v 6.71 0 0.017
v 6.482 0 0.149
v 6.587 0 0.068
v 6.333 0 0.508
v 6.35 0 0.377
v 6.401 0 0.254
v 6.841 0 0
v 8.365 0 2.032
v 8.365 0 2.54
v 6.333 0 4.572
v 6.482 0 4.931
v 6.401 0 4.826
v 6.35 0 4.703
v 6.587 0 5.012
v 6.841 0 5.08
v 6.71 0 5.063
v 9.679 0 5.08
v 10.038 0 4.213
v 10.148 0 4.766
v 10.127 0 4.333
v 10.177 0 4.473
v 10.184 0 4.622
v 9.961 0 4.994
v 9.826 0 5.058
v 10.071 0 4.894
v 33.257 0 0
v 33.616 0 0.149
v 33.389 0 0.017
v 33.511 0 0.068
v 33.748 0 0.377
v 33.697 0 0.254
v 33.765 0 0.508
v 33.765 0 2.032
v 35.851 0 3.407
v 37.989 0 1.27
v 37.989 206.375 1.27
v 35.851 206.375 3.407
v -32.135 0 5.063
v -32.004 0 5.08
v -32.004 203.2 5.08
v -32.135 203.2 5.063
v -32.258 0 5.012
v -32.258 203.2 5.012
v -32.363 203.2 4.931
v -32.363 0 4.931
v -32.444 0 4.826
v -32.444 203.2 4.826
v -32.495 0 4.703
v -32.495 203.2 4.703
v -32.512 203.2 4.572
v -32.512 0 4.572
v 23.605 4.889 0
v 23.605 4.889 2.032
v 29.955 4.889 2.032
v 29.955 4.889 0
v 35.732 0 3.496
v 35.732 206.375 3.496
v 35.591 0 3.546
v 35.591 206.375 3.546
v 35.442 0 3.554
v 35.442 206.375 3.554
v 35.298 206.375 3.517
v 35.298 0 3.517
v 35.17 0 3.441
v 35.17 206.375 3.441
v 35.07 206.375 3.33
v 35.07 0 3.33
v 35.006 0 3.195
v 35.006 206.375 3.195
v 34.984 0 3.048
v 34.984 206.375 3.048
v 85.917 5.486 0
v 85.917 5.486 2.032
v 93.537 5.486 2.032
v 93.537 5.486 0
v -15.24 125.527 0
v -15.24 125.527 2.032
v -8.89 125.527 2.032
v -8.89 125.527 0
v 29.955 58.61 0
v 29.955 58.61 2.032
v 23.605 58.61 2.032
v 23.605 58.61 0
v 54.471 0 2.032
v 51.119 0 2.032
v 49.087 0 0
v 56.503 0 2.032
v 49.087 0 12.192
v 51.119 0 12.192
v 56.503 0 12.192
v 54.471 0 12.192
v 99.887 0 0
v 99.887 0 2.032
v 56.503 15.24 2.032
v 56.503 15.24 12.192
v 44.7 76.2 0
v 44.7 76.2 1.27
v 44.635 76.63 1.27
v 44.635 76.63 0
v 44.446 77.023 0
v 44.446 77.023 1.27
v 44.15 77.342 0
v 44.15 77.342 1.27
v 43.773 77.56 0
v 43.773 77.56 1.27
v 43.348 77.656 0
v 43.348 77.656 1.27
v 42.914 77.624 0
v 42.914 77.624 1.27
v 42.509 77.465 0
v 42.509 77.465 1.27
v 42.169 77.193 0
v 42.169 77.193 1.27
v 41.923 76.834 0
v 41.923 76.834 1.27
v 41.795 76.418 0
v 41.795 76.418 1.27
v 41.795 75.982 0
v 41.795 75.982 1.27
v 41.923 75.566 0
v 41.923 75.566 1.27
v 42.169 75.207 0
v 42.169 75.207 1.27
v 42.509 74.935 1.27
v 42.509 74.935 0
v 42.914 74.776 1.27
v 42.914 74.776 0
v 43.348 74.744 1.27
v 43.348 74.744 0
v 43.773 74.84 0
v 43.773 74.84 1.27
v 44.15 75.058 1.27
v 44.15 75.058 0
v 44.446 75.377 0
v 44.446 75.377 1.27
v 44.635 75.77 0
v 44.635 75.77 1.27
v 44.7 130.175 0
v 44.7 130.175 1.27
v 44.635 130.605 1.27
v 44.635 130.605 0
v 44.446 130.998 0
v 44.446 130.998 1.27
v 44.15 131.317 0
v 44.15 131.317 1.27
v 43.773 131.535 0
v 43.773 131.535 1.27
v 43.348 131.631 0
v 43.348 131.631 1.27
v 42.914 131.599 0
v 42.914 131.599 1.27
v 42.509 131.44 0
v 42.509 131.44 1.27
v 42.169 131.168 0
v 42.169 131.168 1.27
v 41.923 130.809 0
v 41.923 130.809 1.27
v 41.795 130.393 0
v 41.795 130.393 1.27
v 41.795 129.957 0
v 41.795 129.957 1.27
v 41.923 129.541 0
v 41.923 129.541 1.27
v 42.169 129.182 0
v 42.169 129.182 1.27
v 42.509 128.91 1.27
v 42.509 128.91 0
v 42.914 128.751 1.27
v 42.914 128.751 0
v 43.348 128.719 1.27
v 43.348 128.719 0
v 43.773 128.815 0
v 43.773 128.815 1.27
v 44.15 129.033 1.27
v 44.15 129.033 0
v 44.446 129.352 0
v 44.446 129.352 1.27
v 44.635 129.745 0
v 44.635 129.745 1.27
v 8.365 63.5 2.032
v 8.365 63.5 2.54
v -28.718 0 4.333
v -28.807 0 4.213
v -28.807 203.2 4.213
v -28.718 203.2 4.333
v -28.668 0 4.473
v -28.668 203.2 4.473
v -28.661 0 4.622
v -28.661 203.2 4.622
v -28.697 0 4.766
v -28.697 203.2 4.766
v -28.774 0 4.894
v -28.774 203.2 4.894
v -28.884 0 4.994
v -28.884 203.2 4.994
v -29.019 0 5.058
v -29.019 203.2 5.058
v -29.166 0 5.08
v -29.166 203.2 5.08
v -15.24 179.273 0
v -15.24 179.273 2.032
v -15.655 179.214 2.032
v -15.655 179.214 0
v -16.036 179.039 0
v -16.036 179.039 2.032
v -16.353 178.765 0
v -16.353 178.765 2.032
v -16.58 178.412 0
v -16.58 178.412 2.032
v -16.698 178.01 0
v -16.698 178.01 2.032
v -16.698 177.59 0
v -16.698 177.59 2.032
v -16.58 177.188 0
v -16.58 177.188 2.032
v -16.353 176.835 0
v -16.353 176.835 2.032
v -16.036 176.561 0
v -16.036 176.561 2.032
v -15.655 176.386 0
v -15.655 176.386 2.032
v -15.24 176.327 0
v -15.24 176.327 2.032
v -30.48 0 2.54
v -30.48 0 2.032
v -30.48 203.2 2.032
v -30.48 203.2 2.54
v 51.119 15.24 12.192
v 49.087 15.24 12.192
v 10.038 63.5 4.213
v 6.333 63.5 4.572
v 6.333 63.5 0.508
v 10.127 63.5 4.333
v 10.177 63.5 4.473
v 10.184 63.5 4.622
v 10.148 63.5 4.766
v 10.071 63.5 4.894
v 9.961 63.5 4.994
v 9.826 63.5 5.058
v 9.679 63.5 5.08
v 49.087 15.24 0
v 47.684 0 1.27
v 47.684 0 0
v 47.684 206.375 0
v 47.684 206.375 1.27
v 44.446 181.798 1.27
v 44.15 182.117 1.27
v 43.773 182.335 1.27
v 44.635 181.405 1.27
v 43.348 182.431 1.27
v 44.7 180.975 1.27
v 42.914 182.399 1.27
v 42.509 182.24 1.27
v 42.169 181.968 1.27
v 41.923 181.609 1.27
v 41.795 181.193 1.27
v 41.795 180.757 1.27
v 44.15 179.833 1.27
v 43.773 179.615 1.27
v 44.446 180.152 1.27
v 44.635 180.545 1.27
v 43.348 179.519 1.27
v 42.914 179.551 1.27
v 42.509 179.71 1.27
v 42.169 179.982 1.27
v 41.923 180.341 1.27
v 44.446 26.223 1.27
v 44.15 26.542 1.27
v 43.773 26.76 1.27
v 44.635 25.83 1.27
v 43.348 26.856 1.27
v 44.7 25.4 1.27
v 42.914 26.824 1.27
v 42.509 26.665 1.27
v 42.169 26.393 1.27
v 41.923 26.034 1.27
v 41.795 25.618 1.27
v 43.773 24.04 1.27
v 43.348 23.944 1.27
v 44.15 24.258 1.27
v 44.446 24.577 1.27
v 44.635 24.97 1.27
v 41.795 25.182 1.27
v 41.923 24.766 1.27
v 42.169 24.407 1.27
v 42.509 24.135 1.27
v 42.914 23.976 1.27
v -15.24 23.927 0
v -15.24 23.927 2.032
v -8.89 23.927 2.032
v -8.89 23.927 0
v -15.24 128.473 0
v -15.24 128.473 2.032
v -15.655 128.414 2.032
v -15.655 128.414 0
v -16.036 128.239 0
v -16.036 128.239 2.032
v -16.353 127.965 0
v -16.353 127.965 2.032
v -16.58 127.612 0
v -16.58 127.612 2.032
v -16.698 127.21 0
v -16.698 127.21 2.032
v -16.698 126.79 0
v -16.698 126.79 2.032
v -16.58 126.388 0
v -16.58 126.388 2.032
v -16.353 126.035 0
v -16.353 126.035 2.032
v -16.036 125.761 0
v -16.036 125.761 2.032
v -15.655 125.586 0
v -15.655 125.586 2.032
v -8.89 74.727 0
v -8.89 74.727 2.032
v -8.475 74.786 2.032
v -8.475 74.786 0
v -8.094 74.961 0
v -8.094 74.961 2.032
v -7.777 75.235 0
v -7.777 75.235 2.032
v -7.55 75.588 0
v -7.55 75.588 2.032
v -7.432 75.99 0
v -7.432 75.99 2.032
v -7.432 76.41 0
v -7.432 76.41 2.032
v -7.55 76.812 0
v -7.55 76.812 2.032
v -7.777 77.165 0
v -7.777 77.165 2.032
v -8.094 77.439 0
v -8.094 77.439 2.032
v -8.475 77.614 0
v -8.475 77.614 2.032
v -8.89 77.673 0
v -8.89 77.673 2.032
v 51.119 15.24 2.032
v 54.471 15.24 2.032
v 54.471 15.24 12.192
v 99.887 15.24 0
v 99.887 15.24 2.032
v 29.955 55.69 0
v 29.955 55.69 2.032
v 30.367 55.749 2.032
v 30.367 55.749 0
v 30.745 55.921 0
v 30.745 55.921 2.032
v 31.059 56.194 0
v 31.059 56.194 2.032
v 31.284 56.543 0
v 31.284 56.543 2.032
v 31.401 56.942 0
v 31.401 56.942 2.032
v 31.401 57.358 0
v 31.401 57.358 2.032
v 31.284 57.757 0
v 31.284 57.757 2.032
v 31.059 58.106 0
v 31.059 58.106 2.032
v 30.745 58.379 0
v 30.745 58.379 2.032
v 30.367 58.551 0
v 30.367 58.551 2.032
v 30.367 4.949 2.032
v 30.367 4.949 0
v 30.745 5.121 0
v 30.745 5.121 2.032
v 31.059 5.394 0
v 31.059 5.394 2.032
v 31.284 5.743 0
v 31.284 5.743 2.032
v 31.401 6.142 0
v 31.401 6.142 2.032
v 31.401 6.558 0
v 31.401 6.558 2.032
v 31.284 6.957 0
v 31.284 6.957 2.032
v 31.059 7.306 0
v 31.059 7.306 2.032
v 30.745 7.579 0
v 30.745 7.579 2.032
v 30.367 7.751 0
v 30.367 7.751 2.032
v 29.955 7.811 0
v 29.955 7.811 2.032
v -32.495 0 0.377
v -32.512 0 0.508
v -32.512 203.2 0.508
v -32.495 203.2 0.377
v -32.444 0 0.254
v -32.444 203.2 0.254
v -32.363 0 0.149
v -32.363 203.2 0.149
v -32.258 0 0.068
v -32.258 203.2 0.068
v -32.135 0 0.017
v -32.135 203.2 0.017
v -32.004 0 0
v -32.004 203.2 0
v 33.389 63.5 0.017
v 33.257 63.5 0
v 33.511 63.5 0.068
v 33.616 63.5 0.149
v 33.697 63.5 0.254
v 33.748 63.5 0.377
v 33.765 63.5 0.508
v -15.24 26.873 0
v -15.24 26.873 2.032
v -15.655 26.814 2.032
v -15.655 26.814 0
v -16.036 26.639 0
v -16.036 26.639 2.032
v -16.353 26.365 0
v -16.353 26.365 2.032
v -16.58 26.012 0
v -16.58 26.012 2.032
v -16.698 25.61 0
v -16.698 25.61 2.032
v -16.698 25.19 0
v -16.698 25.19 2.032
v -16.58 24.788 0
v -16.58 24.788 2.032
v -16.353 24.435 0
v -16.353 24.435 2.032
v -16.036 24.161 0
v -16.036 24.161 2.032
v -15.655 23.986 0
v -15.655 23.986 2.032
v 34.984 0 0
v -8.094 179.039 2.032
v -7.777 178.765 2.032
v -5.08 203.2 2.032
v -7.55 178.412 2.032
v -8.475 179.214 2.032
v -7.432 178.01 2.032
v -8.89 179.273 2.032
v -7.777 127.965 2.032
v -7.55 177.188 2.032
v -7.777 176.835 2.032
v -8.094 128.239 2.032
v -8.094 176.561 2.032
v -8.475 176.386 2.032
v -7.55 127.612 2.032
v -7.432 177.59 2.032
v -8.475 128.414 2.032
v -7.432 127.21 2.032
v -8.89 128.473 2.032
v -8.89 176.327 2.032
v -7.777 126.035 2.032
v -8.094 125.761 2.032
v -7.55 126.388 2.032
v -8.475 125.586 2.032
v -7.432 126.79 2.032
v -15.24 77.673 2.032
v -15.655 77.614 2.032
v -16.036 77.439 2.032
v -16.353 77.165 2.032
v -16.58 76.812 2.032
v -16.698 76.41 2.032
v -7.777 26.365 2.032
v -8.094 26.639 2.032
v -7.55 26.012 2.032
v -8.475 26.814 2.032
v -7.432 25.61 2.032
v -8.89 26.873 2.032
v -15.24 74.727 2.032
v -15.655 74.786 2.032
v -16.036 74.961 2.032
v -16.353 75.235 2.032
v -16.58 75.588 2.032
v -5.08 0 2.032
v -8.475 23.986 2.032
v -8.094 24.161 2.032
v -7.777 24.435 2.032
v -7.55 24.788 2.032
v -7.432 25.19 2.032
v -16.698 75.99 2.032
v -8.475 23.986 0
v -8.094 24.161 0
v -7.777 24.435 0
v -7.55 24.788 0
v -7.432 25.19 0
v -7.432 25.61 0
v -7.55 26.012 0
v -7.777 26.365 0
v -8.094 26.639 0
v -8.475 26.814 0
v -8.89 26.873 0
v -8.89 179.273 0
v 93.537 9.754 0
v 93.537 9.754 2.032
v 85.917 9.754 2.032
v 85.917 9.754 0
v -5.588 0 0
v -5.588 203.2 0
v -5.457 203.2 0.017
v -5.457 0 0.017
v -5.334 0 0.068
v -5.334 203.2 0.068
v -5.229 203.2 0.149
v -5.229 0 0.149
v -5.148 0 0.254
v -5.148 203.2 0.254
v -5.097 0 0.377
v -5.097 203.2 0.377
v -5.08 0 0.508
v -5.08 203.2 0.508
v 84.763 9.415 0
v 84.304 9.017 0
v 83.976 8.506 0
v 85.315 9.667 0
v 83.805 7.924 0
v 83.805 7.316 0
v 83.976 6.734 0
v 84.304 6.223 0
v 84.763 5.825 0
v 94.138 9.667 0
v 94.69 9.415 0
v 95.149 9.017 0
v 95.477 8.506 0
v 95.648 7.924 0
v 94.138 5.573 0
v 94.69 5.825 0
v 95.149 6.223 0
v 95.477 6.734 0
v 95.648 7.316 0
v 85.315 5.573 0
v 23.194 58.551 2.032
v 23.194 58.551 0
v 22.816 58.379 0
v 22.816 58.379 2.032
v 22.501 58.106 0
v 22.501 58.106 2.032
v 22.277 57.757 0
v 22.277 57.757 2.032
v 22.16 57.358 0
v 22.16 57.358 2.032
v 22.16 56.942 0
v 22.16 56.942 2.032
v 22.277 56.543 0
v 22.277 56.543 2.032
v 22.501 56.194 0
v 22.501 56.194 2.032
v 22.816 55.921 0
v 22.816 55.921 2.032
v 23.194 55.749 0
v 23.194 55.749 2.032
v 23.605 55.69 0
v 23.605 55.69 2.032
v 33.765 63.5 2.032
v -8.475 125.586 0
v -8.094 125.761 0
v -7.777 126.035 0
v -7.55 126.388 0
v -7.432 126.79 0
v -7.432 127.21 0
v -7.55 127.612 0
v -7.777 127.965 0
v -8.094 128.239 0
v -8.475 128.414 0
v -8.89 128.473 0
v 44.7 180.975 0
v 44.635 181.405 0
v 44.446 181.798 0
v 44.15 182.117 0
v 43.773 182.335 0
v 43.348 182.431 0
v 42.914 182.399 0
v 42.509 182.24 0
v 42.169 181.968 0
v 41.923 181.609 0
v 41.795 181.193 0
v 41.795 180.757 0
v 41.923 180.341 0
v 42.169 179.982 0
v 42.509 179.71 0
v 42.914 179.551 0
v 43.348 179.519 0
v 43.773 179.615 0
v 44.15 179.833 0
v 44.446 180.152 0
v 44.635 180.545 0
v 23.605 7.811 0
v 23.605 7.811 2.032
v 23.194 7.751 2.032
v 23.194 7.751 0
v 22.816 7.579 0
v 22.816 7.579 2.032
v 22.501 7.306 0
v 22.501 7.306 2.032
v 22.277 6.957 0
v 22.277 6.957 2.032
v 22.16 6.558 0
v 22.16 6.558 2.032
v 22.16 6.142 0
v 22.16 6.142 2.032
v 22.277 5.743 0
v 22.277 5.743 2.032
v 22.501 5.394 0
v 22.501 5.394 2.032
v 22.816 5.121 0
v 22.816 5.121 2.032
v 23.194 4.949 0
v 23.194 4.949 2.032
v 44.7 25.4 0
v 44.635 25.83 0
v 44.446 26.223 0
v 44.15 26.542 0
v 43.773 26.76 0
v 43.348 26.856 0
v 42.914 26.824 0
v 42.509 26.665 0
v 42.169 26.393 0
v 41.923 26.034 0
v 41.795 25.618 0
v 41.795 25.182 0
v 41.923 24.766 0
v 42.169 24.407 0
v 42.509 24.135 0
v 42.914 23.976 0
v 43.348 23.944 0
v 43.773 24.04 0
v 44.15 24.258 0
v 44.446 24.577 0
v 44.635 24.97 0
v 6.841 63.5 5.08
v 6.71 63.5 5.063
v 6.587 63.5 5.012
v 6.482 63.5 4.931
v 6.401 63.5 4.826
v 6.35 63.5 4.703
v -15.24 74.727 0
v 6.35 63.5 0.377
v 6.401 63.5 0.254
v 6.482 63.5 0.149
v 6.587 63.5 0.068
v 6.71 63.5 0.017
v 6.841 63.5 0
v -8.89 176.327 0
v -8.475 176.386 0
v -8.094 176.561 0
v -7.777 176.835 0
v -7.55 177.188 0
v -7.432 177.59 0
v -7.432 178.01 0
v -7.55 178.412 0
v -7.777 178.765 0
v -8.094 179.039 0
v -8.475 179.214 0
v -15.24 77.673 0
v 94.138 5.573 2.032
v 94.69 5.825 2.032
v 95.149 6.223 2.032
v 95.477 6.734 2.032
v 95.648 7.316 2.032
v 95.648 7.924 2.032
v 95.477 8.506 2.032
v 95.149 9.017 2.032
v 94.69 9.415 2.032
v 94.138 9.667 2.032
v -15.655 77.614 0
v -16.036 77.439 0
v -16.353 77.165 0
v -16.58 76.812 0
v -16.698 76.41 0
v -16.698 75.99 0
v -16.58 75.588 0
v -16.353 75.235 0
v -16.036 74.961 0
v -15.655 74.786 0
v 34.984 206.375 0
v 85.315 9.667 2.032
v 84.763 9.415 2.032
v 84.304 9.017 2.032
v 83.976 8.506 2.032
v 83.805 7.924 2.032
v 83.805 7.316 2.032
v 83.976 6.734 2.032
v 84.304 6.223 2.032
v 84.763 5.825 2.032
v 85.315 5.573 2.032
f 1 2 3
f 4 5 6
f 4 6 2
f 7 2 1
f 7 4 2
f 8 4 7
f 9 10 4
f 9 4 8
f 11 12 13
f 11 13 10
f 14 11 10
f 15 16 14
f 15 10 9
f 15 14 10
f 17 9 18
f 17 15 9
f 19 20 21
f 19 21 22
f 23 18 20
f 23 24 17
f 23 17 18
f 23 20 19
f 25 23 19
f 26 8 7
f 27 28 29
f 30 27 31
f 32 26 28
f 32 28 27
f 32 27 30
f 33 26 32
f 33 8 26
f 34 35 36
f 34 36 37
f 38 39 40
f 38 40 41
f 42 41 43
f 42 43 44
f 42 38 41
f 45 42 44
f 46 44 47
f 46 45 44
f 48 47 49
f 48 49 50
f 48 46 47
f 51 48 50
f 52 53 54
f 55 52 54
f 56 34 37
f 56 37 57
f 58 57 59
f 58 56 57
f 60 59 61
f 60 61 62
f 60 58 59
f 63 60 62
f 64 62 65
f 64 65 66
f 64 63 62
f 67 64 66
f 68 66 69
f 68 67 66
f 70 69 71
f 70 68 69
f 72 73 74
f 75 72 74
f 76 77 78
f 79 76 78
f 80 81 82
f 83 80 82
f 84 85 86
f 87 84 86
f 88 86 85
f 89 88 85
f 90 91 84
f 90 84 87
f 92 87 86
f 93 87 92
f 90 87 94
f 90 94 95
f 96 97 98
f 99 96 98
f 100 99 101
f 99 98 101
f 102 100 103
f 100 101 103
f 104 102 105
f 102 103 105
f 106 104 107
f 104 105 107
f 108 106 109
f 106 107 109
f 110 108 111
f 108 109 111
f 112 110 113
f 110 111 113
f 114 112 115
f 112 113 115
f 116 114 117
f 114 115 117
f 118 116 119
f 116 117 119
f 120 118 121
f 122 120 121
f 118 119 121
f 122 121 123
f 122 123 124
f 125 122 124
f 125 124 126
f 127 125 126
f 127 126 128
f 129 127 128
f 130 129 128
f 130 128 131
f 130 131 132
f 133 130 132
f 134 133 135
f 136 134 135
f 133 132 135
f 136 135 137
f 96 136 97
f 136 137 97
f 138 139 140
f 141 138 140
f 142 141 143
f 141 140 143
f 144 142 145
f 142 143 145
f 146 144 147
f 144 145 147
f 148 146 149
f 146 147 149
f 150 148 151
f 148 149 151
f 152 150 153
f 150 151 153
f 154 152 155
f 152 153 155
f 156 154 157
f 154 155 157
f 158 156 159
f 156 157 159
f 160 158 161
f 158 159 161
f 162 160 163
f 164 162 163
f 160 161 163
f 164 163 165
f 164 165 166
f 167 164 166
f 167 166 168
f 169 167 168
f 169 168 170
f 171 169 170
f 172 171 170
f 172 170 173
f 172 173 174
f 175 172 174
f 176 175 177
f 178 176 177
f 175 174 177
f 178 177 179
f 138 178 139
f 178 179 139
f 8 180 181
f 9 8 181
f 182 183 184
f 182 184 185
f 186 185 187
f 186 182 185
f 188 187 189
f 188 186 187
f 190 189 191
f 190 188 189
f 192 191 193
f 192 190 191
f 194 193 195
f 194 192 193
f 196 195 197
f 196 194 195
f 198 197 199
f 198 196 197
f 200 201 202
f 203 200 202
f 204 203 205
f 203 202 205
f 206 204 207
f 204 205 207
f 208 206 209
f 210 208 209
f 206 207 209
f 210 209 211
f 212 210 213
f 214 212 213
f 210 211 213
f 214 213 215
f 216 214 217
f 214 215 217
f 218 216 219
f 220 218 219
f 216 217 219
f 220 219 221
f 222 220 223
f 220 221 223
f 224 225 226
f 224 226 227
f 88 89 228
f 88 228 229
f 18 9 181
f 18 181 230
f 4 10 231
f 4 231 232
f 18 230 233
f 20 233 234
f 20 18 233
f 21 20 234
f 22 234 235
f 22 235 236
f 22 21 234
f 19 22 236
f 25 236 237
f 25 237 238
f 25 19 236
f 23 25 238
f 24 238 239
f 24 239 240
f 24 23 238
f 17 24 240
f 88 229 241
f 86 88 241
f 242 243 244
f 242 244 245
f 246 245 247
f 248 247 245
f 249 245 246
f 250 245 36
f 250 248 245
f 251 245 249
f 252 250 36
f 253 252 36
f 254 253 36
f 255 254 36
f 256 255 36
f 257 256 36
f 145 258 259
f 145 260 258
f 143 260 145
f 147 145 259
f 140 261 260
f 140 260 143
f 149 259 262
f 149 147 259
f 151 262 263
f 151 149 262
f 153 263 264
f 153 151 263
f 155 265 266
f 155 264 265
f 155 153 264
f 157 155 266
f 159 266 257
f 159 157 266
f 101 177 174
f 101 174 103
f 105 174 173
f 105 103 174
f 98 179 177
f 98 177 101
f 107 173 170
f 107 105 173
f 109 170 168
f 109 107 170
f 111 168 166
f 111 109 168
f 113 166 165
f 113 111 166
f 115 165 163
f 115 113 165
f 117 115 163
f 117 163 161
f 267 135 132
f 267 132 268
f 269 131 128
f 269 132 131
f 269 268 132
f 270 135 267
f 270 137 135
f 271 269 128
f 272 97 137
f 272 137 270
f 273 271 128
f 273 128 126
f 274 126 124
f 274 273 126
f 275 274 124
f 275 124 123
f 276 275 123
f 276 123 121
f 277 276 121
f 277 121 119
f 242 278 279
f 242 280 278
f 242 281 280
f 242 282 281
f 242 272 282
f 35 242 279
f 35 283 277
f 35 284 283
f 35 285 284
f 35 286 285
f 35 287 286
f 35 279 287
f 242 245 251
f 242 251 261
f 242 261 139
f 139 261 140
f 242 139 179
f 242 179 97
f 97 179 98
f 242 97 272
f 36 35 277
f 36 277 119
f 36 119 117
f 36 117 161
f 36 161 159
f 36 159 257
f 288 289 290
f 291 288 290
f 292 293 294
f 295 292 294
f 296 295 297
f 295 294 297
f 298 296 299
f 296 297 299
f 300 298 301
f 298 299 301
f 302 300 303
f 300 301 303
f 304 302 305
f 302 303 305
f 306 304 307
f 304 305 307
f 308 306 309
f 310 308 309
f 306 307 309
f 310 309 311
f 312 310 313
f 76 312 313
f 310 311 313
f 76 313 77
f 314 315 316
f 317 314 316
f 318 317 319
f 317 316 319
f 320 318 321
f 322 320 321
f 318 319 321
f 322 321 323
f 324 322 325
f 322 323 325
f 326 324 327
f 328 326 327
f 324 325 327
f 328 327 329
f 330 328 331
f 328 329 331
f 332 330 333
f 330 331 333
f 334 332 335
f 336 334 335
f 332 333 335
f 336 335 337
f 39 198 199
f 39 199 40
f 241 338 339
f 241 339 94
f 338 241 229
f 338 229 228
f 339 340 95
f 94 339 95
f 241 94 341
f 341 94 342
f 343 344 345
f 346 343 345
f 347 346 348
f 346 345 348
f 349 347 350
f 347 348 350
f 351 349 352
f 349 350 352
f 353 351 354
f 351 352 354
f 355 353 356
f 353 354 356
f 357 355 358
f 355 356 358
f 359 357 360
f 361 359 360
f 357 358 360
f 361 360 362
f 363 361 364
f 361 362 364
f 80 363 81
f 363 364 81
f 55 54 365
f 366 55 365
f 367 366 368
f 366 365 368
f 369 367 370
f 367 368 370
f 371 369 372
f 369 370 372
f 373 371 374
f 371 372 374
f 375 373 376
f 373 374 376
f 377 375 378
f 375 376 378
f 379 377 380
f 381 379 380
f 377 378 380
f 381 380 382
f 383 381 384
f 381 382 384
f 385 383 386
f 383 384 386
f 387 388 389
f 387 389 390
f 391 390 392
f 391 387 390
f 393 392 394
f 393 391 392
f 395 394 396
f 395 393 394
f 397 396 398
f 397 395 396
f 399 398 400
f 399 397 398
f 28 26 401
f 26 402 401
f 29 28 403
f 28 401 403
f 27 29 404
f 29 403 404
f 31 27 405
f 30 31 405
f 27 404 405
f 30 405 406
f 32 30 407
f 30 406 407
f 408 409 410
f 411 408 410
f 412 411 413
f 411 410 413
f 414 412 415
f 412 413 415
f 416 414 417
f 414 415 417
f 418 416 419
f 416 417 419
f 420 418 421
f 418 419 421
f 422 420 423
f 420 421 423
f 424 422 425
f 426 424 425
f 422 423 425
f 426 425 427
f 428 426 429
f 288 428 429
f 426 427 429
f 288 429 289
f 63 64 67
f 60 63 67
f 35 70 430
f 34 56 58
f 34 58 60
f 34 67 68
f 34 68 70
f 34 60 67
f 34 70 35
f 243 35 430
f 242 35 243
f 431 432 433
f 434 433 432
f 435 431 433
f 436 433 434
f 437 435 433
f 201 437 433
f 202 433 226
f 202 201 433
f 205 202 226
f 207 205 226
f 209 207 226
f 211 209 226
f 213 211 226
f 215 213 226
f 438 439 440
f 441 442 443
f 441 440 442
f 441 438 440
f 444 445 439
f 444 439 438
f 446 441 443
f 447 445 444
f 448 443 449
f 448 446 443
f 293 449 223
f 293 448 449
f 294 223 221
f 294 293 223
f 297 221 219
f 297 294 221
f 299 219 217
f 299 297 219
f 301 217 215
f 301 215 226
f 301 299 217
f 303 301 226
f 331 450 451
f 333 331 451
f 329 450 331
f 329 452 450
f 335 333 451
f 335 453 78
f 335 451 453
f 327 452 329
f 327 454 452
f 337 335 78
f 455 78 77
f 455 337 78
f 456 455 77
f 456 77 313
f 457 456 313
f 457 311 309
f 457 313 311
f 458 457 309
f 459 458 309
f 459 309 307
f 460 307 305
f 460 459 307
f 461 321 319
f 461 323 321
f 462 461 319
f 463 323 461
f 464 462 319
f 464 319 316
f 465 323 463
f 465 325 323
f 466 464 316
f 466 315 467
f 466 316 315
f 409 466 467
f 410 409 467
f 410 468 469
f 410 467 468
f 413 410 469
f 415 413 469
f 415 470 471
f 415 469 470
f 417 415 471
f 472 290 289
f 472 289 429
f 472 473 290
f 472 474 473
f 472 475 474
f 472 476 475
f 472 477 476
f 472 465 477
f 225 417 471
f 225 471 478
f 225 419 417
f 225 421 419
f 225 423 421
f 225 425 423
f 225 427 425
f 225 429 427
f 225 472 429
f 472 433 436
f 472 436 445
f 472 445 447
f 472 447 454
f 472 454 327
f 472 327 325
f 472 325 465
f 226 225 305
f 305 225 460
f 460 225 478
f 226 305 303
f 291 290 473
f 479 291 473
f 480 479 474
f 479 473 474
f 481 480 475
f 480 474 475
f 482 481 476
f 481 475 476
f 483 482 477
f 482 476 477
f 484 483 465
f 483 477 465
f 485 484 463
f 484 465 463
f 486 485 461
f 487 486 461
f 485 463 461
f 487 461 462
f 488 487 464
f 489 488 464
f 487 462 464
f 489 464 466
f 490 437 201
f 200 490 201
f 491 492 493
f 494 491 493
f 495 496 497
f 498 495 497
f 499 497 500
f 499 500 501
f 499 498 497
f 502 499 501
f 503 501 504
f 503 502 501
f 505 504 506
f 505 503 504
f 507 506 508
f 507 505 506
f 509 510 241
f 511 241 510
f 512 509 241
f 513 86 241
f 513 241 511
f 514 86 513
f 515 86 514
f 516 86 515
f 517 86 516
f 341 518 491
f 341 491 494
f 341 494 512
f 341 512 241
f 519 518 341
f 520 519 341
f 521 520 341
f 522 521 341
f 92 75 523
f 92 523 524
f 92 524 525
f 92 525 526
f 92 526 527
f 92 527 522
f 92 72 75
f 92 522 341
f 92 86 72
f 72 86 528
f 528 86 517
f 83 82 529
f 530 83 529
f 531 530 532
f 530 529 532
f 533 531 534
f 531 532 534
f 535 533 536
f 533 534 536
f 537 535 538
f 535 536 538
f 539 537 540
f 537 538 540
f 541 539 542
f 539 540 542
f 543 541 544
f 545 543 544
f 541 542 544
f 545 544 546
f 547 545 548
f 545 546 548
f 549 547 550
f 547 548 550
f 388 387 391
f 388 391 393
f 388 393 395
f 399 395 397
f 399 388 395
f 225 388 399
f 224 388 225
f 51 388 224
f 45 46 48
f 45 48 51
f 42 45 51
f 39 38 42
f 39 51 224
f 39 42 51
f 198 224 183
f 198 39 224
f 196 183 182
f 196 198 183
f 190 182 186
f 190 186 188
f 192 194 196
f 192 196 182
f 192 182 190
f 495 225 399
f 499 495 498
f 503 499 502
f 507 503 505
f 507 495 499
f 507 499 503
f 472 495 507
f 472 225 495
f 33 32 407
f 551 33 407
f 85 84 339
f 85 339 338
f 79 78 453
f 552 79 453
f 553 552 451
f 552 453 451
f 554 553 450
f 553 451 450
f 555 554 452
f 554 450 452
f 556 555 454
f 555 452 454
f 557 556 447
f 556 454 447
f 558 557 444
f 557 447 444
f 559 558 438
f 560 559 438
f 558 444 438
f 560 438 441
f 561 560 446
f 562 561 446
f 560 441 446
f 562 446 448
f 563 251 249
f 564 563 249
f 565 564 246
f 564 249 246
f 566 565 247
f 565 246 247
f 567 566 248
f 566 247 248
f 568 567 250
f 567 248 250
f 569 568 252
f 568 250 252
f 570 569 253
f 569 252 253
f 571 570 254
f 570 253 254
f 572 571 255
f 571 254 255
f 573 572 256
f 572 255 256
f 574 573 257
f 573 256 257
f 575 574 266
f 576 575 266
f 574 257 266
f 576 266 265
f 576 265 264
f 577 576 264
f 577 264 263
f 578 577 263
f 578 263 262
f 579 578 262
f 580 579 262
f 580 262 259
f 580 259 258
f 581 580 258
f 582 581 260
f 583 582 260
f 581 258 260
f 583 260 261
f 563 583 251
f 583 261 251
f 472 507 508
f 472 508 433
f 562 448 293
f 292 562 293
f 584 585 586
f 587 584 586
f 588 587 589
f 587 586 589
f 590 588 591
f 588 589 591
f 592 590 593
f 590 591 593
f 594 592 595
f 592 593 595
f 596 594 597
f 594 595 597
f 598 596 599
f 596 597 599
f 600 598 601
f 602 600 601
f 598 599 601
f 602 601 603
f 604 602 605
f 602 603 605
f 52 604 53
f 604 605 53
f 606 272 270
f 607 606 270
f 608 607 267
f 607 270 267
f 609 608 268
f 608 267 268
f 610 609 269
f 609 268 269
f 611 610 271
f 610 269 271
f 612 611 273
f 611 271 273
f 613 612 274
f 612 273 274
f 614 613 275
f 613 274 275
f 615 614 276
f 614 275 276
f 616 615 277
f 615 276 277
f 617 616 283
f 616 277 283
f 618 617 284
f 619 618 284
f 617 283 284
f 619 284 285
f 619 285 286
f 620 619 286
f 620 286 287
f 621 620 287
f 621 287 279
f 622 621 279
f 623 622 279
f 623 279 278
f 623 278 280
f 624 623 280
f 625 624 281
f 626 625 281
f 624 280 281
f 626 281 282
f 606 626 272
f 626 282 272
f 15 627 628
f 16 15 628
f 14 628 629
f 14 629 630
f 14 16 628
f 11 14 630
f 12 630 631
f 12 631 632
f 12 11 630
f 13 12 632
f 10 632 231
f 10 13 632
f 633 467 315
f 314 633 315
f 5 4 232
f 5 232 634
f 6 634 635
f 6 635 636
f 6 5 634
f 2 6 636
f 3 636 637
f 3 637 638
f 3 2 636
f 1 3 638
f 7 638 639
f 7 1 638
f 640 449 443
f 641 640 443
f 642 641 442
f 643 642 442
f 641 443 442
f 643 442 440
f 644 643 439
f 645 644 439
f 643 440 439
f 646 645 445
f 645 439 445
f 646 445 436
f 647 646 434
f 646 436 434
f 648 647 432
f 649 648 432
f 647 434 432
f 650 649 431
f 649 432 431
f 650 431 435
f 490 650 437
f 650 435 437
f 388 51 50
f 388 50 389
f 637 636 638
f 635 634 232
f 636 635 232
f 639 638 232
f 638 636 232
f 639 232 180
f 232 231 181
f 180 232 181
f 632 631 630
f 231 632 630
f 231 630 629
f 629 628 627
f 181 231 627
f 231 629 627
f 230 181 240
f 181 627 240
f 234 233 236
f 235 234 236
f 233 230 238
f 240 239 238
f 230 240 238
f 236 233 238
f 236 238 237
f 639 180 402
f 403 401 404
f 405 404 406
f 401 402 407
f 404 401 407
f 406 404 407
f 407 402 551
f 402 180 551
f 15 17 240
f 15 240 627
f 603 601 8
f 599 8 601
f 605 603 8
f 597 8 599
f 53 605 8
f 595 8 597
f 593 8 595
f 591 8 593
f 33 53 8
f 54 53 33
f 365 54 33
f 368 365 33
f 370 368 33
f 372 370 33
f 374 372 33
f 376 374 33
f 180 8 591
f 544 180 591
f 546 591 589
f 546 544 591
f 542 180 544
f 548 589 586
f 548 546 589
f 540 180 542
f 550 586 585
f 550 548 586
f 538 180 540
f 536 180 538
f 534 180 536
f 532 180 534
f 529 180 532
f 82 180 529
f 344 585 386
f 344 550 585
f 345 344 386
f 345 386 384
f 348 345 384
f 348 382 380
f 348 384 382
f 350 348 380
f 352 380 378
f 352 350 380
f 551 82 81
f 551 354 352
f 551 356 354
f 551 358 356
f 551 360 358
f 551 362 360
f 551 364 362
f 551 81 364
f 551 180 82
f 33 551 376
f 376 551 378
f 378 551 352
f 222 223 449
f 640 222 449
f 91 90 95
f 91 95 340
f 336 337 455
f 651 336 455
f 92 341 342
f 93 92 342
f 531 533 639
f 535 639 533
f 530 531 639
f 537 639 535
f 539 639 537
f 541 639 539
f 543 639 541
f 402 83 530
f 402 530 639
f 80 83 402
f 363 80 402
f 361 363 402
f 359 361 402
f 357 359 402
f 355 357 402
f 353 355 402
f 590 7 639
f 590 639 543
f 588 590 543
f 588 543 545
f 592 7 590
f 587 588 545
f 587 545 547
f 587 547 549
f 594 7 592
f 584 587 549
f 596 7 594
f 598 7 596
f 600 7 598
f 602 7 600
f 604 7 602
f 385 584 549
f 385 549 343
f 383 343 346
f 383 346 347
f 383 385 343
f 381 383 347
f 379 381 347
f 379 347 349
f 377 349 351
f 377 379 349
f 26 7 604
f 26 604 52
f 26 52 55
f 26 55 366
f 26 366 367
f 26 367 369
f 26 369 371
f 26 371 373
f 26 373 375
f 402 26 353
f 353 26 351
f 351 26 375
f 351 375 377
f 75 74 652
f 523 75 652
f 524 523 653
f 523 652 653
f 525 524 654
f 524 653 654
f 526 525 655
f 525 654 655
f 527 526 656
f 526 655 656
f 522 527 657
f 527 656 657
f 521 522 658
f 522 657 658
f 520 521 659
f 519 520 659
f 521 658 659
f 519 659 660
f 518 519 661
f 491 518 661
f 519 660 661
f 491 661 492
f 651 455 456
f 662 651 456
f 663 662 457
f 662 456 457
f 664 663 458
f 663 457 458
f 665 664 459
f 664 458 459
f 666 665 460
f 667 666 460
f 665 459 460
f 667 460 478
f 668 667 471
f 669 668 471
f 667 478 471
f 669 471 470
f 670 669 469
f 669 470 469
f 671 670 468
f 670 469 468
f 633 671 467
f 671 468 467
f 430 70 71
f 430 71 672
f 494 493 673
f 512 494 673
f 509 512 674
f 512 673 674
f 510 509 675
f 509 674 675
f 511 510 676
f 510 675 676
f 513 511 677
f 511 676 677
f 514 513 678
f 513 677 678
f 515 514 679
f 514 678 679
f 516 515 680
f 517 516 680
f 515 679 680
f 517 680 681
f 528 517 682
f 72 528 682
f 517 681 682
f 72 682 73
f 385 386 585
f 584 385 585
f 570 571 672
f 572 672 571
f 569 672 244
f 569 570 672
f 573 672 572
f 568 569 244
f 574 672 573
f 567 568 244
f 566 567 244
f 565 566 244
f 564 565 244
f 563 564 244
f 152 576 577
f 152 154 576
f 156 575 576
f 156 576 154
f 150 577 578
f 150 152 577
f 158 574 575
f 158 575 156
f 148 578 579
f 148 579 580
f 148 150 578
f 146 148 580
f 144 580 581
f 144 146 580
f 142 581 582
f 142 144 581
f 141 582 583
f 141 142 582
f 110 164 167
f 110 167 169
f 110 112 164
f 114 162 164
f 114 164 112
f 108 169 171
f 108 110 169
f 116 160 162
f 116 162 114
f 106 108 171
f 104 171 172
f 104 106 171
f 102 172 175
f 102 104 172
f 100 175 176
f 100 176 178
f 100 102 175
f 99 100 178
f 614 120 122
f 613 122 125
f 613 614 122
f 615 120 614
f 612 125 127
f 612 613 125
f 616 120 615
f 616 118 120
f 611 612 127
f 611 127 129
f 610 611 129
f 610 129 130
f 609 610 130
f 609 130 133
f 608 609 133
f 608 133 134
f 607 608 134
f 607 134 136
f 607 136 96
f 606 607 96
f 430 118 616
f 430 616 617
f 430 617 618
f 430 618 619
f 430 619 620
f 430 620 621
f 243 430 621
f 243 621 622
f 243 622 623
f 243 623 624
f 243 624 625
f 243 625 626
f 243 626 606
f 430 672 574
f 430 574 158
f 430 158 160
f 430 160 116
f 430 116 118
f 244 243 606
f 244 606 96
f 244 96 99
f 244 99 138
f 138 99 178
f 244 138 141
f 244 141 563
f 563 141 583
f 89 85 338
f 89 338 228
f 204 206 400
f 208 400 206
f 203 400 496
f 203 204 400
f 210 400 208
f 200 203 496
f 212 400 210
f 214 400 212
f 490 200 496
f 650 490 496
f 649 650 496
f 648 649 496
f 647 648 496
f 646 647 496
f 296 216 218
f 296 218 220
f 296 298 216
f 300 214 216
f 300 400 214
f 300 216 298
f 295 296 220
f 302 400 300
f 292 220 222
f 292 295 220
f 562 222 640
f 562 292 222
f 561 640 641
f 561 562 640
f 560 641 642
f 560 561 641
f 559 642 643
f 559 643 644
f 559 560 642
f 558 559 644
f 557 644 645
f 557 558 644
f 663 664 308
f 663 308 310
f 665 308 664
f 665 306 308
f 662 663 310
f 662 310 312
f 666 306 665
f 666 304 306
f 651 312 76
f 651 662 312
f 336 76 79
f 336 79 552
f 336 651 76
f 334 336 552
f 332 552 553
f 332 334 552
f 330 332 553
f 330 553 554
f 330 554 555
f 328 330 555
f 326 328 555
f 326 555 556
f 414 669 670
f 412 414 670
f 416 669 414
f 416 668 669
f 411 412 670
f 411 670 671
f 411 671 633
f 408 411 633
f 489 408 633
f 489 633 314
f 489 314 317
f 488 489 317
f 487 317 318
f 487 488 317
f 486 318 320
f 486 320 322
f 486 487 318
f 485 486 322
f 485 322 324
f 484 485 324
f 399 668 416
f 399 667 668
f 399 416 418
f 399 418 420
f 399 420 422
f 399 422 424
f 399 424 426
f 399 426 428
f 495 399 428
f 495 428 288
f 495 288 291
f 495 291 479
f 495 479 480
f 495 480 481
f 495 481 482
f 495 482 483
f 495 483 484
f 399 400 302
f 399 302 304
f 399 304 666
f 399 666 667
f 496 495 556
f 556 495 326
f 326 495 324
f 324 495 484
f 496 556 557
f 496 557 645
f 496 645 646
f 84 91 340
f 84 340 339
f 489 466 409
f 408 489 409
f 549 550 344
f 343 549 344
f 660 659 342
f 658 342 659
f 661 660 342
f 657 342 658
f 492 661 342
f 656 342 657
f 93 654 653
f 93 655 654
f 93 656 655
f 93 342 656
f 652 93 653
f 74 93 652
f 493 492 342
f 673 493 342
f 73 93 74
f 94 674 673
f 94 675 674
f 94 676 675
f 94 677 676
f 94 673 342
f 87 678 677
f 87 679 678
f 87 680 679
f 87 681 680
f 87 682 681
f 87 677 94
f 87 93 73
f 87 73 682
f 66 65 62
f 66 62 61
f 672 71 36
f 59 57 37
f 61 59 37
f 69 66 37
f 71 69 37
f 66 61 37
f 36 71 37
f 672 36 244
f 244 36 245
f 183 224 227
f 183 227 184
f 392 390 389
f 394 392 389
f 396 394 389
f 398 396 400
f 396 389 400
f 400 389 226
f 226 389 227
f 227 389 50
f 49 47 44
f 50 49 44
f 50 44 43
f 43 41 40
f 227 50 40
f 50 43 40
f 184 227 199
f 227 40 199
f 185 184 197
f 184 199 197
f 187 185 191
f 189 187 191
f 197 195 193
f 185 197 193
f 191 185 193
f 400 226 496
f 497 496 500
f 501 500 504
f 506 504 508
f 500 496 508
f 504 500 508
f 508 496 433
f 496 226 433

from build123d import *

# Parameters (mm, degrees)
F0_W      = 25.4
F0_H      = 63.5
F1_DEPTH  = 2.032
F3_DEPTH  = 63.5
F4_R      = 0.508
F6_DEPTH  = 2.032
F8_DEPTH  = 206.375
F9_R      = 1.4605
F10_DEPTH = 1.27
F12_DEPTH = 15.24
F14_DEPTH = 2.032
F16_DEPTH = 203.2
F18_DEPTH = 2.032


with BuildPart() as f1:
    # F0 (on Top) → F1 (new body)
    with BuildSketch(Plane.XY):
        with Locations((21.06514, 31.75)):
            Rectangle(F0_W, F0_H)
    extrude(amount=F1_DEPTH)

    # F2 (on face) → F3 (join)
    with BuildSketch(Plane.XZ):
        with BuildLine():
            Line((6.84114, 0), (8.36514, 0))
            Line((8.36514, 0), (8.36514, 2.54))
            Line((8.36514, 2.54), (10.037929, 4.21279))
            ThreePointArc((10.037929, 4.21279), (10.14805, 4.766403), (9.678719, 5.08))
            Line((9.678719, 5.08), (6.84114, 5.08))
            ThreePointArc((6.84114, 5.08), (6.481929, 4.93121), (6.33314, 4.572))
            Line((6.33314, 4.572), (6.33314, 0.508))
            ThreePointArc((6.33314, 0.508), (6.481929, 0.14879), (6.84114, 0))
        make_face()
    extrude(amount=-F3_DEPTH)

    # F4
    f4_edges = [f1.edges().sort_by_distance(p)[0] for p in [
        (33.76514, 31.75, 0),
    ]]
    fillet(f4_edges, radius=F4_R)

    # F5 (on face) → F6 (cut, through all)
    with BuildSketch(Plane.XY.offset(2.032)):
        with BuildLine():
            Line((23.60514, 4.8895), (29.95514, 4.8895))
            ThreePointArc((29.95514, 4.8895), (31.41564, 6.35), (29.95514, 7.8105))
            Line((29.95514, 7.8105), (23.60514, 7.8105))
            ThreePointArc((23.60514, 7.8105), (22.14464, 6.35), (23.60514, 4.8895))
        make_face()
        with BuildLine():
            Line((23.60514, 55.6895), (29.95514, 55.6895))
            ThreePointArc((29.95514, 55.6895), (31.41564, 57.15), (29.95514, 58.6105))
            Line((29.95514, 58.6105), (23.60514, 58.6105))
            ThreePointArc((23.60514, 58.6105), (22.14464, 57.15), (23.60514, 55.6895))
        make_face()
    extrude(amount=-F6_DEPTH, mode=Mode.SUBTRACT)


with BuildPart() as f8:
    # F7 (on Front) → F8 (new body)
    with BuildSketch(Plane.XZ):
        with BuildLine():
            ThreePointArc((35.851475, 3.40721), (35.297861, 3.517331), (34.984265, 3.048))
            Line((34.984265, 3.048), (34.984265, 0))
            Line((34.984265, 0), (47.684265, 0))
            Line((47.684265, 0), (47.684265, 1.27))
            Line((47.684265, 1.27), (37.988685, 1.27))
            Line((37.988685, 1.27), (35.851475, 3.40721))
        make_face()
    extrude(amount=-F8_DEPTH)

    # F9 (on face) → F10 (cut, through all)
    with BuildSketch(Plane.XY.offset(1.27)):
        with Locations((43.239265, 180.975)):
            Circle(F9_R)
        with Locations((43.239265, 130.175)):
            Circle(F9_R)
        with Locations((43.239265, 76.2)):
            Circle(F9_R)
        with Locations((43.239265, 25.4)):
            Circle(F9_R)
    extrude(amount=-F10_DEPTH, mode=Mode.SUBTRACT)


with BuildPart() as f12:
    # F11 (on Front) → F12 (new body)
    with BuildSketch(Plane.XZ):
        Polygon((49.086587, 12.192), (49.086587, 0), (99.886587, 0), (99.886587, 2.032), (56.503387, 2.032), (56.503387, 12.192), (54.471387, 12.192), (54.471387, 2.032), (51.118587, 2.032), (51.118587, 12.192), align=None)
    extrude(amount=-F12_DEPTH)

    # F13 (on face) → F14 (cut, through all)
    with BuildSketch(Plane.XY.offset(2.032)):
        with BuildLine():
            Line((93.536587, 9.7536), (85.916587, 9.7536))
            ThreePointArc((85.916587, 9.7536), (83.782987, 7.62), (85.916587, 5.4864))
            Line((85.916587, 5.4864), (93.536587, 5.4864))
            ThreePointArc((93.536587, 5.4864), (95.670187, 7.62), (93.536587, 9.7536))
        make_face()
    extrude(amount=-F14_DEPTH, mode=Mode.SUBTRACT)


with BuildPart() as f16:
    # F15 (on Front) → F16 (new body)
    with BuildSketch(Plane.XZ):
        with BuildLine():
            Line((-32.004, 0), (-5.588, 0))
            ThreePointArc((-5.588, 0), (-5.22879, 0.14879), (-5.08, 0.508))
            Line((-5.08, 0.508), (-5.08, 2.032))
            Line((-5.08, 2.032), (-30.48, 2.032))
            Line((-30.48, 2.032), (-30.48, 2.54))
            Line((-30.48, 2.54), (-28.80721, 4.21279))
            ThreePointArc((-28.80721, 4.21279), (-28.69709, 4.766403), (-29.16642, 5.08))
            Line((-29.16642, 5.08), (-32.004, 5.08))
            ThreePointArc((-32.004, 5.08), (-32.36321, 4.93121), (-32.512, 4.572))
            Line((-32.512, 4.572), (-32.512, 0.508))
            ThreePointArc((-32.512, 0.508), (-32.36321, 0.14879), (-32.004, 0))
        make_face()
    extrude(amount=-F16_DEPTH)

    # F17 (on face) → F18 (cut, through all)
    with BuildSketch(Plane.XY.offset(2.032)):
        with BuildLine():
            Line((-15.24, 23.9268), (-8.89, 23.9268))
            ThreePointArc((-8.89, 23.9268), (-7.4168, 25.4), (-8.89, 26.8732))
            Line((-8.89, 26.8732), (-15.24, 26.8732))
            ThreePointArc((-15.24, 26.8732), (-16.7132, 25.4), (-15.24, 23.9268))
        make_face()
        with BuildLine():
            Line((-15.24, 74.7268), (-8.89, 74.7268))
            ThreePointArc((-8.89, 74.7268), (-7.4168, 76.2), (-8.89, 77.6732))
            Line((-8.89, 77.6732), (-15.24, 77.6732))
            ThreePointArc((-15.24, 77.6732), (-16.7132, 76.2), (-15.24, 74.7268))
        make_face()
        with BuildLine():
            Line((-15.24, 125.5268), (-8.89, 125.5268))
            ThreePointArc((-8.89, 125.5268), (-7.4168, 127), (-8.89, 128.4732))
            Line((-8.89, 128.4732), (-15.24, 128.4732))
            ThreePointArc((-15.24, 128.4732), (-16.7132, 127), (-15.24, 125.5268))
        make_face()
        with BuildLine():
            Line((-15.24, 176.3268), (-8.89, 176.3268))
            ThreePointArc((-8.89, 176.3268), (-7.4168, 177.8), (-8.89, 179.2732))
            Line((-8.89, 179.2732), (-15.24, 179.2732))
            ThreePointArc((-15.24, 179.2732), (-16.7132, 177.8), (-15.24, 176.3268))
        make_face()
    extrude(amount=-F18_DEPTH, mode=Mode.SUBTRACT)


solid = Compound([f1.part, f8.part, f12.part, f16.part])
